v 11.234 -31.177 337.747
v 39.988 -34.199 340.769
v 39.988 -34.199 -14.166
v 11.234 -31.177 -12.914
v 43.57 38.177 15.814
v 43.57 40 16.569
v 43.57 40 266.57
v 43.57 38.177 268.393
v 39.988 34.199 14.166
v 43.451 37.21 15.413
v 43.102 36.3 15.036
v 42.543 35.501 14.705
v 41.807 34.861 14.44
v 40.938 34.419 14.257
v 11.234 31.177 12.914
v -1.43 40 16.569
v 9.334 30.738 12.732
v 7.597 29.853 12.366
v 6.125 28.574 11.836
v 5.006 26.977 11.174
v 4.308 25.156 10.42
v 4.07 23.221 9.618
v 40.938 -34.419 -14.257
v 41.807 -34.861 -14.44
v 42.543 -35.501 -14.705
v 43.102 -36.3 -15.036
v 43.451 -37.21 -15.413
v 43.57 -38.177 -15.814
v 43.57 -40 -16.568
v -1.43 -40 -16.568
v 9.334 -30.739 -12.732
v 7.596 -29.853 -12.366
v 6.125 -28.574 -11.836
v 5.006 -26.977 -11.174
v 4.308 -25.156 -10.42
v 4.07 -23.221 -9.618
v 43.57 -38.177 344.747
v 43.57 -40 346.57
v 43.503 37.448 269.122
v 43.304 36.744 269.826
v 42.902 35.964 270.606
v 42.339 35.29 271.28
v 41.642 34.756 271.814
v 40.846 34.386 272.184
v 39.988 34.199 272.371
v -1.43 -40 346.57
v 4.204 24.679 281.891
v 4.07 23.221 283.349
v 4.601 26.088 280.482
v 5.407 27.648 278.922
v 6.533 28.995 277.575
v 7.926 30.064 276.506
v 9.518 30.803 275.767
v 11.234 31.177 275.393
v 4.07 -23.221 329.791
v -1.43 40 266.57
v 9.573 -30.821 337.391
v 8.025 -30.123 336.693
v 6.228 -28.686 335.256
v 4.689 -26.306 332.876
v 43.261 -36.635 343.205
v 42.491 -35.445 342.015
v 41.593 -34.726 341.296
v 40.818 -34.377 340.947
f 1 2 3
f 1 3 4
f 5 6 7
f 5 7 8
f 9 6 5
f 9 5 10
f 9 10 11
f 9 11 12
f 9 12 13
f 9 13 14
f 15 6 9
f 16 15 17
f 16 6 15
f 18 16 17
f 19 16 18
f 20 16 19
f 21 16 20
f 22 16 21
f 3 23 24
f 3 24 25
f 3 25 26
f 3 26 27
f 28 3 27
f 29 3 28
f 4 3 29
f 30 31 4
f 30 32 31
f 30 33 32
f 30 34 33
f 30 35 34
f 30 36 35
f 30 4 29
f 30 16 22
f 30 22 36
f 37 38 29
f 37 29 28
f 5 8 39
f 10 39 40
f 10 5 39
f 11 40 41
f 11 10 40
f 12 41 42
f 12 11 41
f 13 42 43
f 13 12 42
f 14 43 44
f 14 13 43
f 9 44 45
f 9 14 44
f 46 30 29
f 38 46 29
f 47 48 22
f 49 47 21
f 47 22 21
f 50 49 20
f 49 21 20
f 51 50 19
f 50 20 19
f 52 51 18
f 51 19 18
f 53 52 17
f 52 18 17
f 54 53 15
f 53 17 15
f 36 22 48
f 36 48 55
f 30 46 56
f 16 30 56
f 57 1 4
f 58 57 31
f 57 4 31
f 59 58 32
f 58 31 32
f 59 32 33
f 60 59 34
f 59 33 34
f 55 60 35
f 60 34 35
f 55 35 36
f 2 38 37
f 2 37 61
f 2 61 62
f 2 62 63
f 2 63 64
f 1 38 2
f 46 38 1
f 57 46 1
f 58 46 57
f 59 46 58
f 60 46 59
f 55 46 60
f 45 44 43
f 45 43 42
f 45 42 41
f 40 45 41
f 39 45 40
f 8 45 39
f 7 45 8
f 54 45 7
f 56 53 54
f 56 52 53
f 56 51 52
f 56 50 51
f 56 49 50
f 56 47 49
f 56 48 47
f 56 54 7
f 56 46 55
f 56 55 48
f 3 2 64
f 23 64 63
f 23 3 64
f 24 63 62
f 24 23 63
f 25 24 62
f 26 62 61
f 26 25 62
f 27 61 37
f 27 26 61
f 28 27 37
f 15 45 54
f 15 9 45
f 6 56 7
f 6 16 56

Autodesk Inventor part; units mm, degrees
ref_plane "Начальная плоскость" through (0, 0, -16.5685) normal (0, 0, 1) x (1, 0, 0)
ref_plane "Конечная плоскость" through (0, 0, 346.57) normal (0, 0, 1) x (1, 0, 0)
sketch "Эскиз" plane through (0, 0, 0) normal (0, 0, 1) x (1, 0, 0)
  line L0 (-1.43, 0) -> (-1.43, 40)
  line L1 (-1.43, 40) -> (43.57, 40)
  line L2 (43.57, 40) -> (43.57, 38.1774)
  line L3 (39.9881, 34.1993) -> (11.2338, 31.1771)
  line L4 (4.07, 23.221) -> (4.07, 0)
  line L5 (4.07, 0) -> (-1.43, 0) construction
  line L6 (23.82, 40) -> (23.82, 32.5) construction
  line L7 (43.57, 34.5758) -> (43.57, 32.5) construction
  line L8 (43.57, 32.5) -> (23.82, 32.5) construction
  line L9 (0, 15) -> (0, -27) construction
  line L10 (-5.539, 0) -> (16.0067, 0) construction
  line L11 (-1.43, 0) -> (-1.43, -40)
  line L12 (-1.43, -40) -> (43.57, -40)
  line L13 (43.57, -40) -> (43.57, -38.1774)
  line L14 (39.9881, -34.1993) -> (11.2338, -31.1771)
  line L15 (4.07, -23.221) -> (4.07, 0)
  arc A0 (11.2338, 31.1771) -> (4.07, 23.221) centre (12.07, 23.221) ccw
  arc A1 (4.07, -23.221) -> (11.2338, -31.1771) centre (12.07, -23.221) ccw
  arc A2 (39.9881, 34.1993) -> (43.57, 38.1774) centre (39.57, 38.1774) ccw
  arc A3 (43.57, -38.1774) -> (39.9881, -34.1993) centre (39.57, -38.1774) ccw
  line L16 (0, 56) -> (0, -56) construction
  line L17 (-15.5135, 0) -> (54.308, 0) construction
  point P0 (4.07, 30.4242)
  point P1 (43.57, -34.5758)
  point P2 (4.07, -30.4242)
  point P3 (23.82, -40)
  point P4 (23.82, -32.5)
  dimension "d0" = 5.5
  dimension "d1" = 40
  dimension "d2" = 45
  dimension "d3" = 7.5
  dimension "d4" = 19.75
  dimension "d5" = 2.0758
  dimension "d23" = 8
  dimension "d24" = 4
  dimension "d25" = 1.43
extrude "Тело" add sketch "Эскиз" along normal up to surface (363.1385 mm away) from surface at -16.5685
sketch "Sketch3" plane through (0, 0, 0) normal (0, 0, 1) x (1, 0, 0)
  line L0 (0, 0) -> (10, 0)
ref_plane "Work Plane3" through (0, 0, 0) normal (0, -1, 0) x (1, 0, 0)
sketch "Sketch4" plane through (0, 0, 0) normal (0, -1, 0) x (1, 0, 0)
  line L0 (-2, -16.5685) -> (12, -16.5685)
  line L1 (-2, 346.57) -> (12, 346.57)
  dimension "d29" = 363.1385
ref_plane "РабПлоскость4" through (21.07, -40, 346.57) normal (0, 0.7071, 0.7071) x (1, 0, 0)
split "Разделение1" plane through (21.07, -40, 346.57) removes the side toward (0, 0.7071, 0.7071)
ref_plane "РабПлоскость5" through (21.07, -40, -16.5685) normal (0, 0.3827, -0.9239) x (1, 0, 0)
split "Разделение2" plane through (21.07, -40, -16.5685) removes the side toward (0, 0.3827, -0.9239)
equation "\"d0\" = G_T"
equation "\"d1\" = 0.5 * G_H"
equation "\"d2\" = G_W"
equation "\"d3\" = G_T1"
equation "\"d4\" = G_C"
equation "\"d23\" = G_IR"
equation "\"d24\" = G_ER"
equation "\"d25\" = ex"
equation "\"d6\" = G_L"
equation "\"G_W\" = 45"
equation "\"G_T\" = 5.5"
equation "\"G_T1\" = 7.5"
equation "\"G_NG\" = 0.105104"
equation "\"G_ER\" = 4"
equation "\"G_IR\" = 8"
equation "\"G_C\" = 19.75"
equation "\"G_L\" = d29"
equation "\"ex\" = 1.43"
equation "\"G_OFFSET_START\" = 16.56854"
equation "\"d26\" = -G_OFFSET_START"
equation "\"d27\" = G_OFFSET_END + B_L"
equation "\"B_L\" = 306.57"
equation "\"G_H\" = 80"
equation "\"G_OFFSET_END\" = 40"
properties part number "ISO 657/11 - CH 80 x 8 - 363,14" material "Сталь, мягкая"
